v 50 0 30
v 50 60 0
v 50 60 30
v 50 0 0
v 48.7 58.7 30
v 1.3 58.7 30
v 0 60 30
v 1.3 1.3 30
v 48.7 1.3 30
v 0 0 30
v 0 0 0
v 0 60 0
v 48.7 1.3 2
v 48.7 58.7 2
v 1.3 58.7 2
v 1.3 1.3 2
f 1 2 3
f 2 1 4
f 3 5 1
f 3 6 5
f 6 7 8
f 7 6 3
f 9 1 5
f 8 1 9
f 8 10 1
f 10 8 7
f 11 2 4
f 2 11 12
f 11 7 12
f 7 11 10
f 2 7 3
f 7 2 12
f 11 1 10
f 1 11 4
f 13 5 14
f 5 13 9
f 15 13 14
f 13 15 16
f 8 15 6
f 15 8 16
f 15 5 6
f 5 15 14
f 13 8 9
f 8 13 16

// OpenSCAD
$fn = 32;

// ----------------------------------------------------------------------
// Open box: 1.3 mm walls
// ----------------------------------------------------------------------

// --- parameters (mm) ---
box_l = 50;               // outer length, X
box_w = 60;               // outer width, Y
box_h = 30;               // outer height, Z
wall = 1.3;               // wall thickness
floor = 2;                // floor thickness

difference() {
  cube([box_l, box_w, box_h]);
  translate([wall, wall, floor])
    cube([box_l - 2 * wall, box_w - 2 * wall, box_h]);
}
